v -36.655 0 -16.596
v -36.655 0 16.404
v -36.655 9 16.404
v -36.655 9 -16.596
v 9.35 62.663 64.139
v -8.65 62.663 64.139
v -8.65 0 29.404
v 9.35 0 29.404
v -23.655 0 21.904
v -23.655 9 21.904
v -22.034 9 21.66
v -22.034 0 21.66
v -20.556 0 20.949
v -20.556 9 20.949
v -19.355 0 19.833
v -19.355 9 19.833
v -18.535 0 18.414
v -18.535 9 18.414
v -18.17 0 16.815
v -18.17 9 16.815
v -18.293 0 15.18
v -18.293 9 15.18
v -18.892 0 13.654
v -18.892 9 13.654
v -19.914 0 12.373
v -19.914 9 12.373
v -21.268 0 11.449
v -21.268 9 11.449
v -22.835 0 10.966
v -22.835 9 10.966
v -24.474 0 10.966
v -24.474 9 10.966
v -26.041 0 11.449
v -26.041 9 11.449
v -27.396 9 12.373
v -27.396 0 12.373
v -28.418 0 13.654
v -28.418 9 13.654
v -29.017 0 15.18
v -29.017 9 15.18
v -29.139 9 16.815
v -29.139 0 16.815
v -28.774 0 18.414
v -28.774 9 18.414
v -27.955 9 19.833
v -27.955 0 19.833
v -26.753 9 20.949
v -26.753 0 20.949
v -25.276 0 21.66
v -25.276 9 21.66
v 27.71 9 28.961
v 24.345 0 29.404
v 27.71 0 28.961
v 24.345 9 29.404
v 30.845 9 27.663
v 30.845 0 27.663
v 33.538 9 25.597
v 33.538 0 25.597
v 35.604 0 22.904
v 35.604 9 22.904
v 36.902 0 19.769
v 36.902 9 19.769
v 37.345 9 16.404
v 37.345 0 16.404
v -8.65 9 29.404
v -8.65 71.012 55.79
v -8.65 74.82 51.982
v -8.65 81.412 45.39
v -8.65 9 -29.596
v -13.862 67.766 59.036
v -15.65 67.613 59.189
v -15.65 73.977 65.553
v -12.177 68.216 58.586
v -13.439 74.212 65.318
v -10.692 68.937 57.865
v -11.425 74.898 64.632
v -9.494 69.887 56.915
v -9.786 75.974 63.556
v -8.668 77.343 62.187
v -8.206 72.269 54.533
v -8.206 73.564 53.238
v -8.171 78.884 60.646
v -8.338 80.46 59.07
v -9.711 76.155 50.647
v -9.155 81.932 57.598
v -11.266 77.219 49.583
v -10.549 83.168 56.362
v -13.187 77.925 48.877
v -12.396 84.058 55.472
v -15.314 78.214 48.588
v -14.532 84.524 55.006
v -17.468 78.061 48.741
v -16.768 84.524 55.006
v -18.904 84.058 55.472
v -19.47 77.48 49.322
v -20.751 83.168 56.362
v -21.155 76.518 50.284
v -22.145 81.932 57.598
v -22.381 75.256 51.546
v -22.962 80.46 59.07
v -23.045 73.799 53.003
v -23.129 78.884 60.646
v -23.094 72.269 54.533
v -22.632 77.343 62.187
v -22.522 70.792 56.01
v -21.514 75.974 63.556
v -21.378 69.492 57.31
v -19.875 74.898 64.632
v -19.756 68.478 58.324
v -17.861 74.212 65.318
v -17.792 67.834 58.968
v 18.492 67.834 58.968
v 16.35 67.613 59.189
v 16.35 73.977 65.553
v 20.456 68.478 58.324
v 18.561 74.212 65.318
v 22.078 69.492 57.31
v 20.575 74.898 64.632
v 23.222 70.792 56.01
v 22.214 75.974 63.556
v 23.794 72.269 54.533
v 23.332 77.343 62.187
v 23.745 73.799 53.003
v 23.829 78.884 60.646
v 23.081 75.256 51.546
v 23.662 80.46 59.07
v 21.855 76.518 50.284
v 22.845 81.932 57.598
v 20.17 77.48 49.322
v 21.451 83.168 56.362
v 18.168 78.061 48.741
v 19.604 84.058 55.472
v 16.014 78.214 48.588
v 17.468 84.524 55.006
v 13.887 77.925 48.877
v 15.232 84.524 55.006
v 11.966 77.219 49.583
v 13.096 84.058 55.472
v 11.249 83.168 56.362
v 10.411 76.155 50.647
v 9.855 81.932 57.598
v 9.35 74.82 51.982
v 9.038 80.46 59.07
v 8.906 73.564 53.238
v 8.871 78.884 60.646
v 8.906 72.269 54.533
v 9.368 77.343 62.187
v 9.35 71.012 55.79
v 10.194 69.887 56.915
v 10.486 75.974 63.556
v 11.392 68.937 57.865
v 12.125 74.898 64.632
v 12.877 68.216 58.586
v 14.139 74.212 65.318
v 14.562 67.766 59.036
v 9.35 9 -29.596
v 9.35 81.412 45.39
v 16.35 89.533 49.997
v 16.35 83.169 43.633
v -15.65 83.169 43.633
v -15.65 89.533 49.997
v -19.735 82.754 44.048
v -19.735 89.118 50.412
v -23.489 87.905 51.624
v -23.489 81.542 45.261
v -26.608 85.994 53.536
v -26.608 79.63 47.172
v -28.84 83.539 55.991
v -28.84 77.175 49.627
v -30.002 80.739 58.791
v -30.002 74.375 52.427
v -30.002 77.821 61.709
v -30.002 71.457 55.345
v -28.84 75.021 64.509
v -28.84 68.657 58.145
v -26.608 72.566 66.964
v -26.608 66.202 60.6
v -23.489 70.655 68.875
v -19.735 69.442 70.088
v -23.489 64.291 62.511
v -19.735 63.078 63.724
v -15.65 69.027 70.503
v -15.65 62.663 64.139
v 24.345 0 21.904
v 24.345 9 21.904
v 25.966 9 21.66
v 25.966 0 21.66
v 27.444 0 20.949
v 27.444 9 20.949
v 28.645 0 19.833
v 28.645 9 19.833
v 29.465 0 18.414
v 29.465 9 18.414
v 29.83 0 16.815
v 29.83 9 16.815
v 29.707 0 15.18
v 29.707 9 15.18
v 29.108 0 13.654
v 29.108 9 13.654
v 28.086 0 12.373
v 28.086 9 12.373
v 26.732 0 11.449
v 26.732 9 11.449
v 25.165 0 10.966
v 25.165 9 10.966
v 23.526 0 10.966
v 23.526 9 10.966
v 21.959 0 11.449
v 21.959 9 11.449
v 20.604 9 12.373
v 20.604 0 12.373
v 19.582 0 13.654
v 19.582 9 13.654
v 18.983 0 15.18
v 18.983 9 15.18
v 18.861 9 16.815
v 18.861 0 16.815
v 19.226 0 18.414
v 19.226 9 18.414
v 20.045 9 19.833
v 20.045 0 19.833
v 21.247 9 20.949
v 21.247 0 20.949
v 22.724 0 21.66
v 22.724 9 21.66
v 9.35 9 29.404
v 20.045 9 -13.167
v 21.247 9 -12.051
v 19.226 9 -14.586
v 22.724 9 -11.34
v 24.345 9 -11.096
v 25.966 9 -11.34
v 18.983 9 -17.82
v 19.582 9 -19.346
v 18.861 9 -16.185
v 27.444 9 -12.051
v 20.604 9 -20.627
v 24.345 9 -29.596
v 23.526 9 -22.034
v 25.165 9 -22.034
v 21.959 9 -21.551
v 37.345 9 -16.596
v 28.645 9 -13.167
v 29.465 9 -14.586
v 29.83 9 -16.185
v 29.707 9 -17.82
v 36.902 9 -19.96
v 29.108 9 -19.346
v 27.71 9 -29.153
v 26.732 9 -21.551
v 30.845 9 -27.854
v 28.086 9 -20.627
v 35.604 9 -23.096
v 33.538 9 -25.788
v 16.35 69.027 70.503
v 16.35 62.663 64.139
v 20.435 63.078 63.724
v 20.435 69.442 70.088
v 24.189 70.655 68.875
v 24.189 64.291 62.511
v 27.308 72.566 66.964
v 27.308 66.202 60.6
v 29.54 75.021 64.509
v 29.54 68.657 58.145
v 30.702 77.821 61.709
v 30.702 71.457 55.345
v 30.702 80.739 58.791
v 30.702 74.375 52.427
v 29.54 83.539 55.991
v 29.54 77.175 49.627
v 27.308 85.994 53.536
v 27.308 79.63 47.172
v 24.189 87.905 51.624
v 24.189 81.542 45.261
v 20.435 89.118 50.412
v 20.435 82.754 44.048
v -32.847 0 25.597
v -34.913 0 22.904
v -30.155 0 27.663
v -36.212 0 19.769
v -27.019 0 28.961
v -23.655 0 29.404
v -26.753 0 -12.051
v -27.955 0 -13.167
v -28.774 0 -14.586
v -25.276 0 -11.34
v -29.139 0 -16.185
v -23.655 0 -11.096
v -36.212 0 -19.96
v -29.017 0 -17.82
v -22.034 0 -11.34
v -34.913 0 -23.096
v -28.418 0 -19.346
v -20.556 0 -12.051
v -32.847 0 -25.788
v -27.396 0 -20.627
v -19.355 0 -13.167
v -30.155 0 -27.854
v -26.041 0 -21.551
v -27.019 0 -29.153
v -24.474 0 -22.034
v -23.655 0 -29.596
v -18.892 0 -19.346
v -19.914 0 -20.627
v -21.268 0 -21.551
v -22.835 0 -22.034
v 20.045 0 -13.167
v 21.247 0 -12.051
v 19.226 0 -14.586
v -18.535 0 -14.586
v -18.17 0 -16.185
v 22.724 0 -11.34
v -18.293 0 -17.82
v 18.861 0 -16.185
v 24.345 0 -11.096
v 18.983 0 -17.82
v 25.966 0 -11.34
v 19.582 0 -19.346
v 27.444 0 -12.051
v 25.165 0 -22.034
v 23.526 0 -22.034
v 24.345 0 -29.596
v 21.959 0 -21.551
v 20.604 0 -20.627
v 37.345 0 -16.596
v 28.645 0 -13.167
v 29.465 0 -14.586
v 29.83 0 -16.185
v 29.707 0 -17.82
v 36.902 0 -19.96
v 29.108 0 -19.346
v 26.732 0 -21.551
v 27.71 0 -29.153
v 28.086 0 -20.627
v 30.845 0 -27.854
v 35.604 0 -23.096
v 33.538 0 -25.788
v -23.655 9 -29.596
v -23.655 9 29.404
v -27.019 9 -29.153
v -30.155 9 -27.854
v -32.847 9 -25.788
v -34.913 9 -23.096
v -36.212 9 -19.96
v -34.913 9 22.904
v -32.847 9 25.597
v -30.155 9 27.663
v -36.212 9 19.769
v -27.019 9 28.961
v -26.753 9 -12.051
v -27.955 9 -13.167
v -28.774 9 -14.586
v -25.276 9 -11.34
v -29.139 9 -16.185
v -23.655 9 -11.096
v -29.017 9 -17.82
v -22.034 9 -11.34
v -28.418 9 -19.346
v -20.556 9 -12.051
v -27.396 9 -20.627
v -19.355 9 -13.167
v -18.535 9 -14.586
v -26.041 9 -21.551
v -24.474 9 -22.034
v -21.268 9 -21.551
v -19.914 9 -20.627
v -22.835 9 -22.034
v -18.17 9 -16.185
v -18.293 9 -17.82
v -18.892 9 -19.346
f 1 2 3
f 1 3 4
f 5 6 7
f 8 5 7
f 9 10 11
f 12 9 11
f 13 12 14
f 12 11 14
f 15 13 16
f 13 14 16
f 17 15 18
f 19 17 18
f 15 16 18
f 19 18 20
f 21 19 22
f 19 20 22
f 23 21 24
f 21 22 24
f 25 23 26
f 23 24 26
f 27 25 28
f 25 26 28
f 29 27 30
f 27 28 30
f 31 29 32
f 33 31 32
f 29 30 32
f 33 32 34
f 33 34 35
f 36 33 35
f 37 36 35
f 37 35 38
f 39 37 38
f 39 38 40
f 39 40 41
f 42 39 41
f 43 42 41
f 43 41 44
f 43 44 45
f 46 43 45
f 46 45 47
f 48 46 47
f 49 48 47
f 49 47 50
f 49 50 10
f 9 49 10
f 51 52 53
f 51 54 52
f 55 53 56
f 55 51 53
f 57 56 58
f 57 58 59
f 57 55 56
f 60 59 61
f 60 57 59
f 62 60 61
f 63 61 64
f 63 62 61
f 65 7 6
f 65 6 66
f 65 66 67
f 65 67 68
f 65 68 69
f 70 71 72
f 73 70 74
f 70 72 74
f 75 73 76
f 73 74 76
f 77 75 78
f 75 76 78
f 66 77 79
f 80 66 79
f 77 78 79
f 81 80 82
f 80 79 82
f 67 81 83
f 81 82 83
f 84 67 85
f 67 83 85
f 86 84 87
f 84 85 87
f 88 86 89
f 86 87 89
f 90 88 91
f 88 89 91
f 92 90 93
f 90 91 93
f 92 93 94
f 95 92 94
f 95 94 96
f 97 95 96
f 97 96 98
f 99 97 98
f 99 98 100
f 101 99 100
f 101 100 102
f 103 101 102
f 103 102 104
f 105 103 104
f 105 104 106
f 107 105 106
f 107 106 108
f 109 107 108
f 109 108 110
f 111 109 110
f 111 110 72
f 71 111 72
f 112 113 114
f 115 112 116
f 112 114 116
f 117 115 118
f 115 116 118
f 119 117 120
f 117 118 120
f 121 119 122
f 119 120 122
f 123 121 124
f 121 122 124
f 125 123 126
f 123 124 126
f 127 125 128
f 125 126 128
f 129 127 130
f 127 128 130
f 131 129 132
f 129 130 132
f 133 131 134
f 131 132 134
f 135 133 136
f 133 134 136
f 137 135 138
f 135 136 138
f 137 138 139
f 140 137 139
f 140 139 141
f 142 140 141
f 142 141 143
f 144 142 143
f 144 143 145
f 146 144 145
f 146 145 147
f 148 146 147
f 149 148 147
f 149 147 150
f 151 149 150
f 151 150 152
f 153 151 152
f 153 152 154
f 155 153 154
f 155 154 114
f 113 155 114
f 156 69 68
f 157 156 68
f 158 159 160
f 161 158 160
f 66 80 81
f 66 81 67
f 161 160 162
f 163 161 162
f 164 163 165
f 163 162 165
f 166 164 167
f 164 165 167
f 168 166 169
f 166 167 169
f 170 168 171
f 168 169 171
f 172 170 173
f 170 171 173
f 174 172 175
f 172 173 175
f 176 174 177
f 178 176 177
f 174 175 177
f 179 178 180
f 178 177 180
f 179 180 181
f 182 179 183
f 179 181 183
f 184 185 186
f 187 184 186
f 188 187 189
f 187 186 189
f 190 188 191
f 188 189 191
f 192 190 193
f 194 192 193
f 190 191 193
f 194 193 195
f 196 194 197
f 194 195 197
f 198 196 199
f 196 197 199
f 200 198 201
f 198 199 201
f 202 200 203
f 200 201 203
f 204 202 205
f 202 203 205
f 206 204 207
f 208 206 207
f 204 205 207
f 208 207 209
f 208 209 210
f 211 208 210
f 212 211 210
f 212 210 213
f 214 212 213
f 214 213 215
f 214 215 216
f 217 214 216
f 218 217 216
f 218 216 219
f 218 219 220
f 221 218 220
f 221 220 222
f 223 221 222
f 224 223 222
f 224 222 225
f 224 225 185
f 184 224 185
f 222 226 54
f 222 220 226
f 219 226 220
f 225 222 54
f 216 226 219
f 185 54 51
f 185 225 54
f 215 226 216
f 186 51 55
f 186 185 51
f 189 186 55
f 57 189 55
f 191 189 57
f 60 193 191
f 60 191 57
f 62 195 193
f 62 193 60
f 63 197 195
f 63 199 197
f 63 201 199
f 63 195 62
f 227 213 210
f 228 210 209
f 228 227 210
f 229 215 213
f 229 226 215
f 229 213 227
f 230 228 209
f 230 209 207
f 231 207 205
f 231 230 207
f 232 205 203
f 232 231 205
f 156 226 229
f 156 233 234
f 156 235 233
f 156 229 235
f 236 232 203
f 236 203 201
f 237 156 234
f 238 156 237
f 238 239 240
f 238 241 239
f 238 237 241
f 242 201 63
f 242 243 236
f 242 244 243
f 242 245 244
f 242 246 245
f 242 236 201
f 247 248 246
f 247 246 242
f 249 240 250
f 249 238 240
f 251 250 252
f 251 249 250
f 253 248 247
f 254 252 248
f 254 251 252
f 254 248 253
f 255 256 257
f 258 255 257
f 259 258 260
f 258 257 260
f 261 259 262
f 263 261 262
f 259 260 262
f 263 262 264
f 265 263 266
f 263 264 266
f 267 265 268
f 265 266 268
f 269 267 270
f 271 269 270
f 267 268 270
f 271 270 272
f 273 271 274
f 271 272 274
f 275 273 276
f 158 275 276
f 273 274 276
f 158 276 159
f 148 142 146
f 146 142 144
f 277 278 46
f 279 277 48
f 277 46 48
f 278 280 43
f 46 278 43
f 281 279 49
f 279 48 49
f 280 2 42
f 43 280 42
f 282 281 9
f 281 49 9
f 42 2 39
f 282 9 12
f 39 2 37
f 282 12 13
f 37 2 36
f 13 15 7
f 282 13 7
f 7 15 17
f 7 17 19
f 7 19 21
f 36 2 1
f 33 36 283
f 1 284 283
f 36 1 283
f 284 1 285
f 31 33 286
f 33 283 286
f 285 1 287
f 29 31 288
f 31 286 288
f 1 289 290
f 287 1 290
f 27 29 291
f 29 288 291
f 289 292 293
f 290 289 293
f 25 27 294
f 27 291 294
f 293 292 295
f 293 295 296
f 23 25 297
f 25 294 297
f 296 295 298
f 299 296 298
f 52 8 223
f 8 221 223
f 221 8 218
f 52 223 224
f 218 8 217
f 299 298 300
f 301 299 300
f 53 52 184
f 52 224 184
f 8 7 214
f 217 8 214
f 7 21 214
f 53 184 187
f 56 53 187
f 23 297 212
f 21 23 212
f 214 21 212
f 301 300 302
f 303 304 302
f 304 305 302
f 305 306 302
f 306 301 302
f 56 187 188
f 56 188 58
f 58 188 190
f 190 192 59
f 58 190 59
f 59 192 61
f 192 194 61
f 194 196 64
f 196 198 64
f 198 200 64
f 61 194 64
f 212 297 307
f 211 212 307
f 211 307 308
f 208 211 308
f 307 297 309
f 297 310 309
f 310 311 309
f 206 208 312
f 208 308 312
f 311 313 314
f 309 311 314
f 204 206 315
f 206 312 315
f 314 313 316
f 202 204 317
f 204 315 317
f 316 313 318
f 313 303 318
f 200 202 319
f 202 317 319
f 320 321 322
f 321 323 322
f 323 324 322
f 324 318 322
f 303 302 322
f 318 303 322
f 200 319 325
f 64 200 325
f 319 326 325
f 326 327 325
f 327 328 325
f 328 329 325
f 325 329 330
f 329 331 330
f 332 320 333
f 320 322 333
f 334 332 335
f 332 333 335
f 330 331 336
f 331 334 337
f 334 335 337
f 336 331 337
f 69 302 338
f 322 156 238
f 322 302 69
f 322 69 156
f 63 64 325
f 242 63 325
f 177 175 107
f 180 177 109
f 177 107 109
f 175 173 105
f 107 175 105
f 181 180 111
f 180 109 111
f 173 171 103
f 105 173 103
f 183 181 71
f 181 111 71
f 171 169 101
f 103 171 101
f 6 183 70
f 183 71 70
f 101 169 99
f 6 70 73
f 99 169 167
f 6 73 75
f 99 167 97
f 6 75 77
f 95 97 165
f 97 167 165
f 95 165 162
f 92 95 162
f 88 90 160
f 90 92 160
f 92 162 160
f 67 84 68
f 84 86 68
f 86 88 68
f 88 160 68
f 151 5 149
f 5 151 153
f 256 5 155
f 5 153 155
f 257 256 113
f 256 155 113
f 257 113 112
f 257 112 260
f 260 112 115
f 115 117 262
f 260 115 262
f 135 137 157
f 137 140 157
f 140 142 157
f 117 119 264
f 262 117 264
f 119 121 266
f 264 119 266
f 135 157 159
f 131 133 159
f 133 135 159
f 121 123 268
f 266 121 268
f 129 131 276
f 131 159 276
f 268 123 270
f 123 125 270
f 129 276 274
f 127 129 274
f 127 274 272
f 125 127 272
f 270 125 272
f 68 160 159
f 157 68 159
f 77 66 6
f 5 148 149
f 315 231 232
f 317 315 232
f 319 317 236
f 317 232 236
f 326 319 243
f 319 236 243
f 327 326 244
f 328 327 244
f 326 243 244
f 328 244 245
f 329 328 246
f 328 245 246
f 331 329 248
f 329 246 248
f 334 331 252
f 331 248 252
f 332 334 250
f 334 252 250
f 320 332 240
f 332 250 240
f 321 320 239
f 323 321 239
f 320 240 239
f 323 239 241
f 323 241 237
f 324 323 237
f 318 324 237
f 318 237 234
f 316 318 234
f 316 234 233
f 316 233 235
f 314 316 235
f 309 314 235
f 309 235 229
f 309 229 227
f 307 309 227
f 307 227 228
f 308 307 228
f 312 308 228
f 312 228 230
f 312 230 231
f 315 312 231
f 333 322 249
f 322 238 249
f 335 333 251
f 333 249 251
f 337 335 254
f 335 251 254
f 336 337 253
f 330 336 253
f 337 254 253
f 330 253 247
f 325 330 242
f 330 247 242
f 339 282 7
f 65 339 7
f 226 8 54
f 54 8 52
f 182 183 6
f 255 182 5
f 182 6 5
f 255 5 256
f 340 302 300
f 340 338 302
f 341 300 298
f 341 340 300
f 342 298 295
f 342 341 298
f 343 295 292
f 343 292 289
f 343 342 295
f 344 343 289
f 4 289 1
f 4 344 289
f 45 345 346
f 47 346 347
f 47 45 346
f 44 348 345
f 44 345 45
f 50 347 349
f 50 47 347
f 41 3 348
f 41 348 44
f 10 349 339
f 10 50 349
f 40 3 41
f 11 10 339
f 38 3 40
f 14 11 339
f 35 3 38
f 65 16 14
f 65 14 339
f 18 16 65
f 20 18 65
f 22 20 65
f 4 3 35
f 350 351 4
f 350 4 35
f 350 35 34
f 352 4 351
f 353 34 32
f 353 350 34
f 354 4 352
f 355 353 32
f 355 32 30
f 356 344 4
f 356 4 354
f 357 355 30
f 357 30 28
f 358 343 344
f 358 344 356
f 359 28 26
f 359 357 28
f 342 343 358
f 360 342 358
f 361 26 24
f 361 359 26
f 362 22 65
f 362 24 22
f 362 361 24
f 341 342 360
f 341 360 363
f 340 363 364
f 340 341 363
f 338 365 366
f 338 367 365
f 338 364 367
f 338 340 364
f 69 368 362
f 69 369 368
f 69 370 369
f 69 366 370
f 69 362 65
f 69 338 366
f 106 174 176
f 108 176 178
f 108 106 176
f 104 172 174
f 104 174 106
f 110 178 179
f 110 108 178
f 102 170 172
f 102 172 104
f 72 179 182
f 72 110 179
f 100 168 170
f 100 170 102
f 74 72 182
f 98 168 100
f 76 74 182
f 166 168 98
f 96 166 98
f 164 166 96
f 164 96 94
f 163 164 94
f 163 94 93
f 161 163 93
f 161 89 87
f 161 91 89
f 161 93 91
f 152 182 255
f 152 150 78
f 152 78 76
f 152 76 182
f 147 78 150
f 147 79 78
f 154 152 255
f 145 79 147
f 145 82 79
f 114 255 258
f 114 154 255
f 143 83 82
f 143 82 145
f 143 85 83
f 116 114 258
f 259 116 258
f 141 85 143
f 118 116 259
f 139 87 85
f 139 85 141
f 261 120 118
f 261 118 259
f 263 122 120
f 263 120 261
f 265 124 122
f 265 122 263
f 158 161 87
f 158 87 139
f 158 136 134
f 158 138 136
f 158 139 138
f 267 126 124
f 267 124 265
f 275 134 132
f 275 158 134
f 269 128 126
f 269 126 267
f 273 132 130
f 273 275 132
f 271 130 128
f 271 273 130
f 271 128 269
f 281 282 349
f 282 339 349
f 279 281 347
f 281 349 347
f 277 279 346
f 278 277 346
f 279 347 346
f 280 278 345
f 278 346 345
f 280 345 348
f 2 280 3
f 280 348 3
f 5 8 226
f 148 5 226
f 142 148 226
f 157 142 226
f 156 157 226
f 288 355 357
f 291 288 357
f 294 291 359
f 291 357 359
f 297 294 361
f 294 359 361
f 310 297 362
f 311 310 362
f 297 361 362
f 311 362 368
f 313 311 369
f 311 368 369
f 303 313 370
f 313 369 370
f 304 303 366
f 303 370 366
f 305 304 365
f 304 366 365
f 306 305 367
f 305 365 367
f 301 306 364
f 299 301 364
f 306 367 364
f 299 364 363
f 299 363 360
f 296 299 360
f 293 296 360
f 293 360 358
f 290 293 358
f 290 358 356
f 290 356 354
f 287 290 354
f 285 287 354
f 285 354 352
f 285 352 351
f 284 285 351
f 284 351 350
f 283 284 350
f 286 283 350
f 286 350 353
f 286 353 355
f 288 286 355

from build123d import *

# Parameters (mm, degrees)
SKETCH1_W            = 74
SKETCH1_H            = 59
EXTRUDE1_DEPTH       = 9
SKETCH2_R            = 5.5
CUT_EXTRUDE1_DEPTH   = 49.493093283
LPATTERN1_COUNT      = 2
LPATTERN1_PITCH      = 48
LPATTERN1_COUNT_DIR2 = 2
LPATTERN1_PITCH_DIR2 = 33
RIB2_START           = -9
RIB2_DEPTH           = 18
EXTRUDE2_DEPTH       = 9
SKETCH7_R            = 7.5
CUT_EXTRUDE2_DEPTH   = 9
FILLET8_R            = 13


# Read off the part's stored shape, not the designer's step: Rib2
with BuildPart() as part:
    # Sketch1 → Extrude1 (new body)
    with BuildSketch(Plane(origin=(0, 0, 0), x_dir=(1, 0, 0), z_dir=(0, 1, 0))):
        with Locations((0.345335821, 0.095708955)):
            Rectangle(SKETCH1_W, SKETCH1_H)
    extrude(amount=EXTRUDE1_DEPTH)

    # Sketch2 → Cut-Extrude1 (cut, through all)
    with BuildSketch(Plane(origin=(0, 9, 0), x_dir=(-1, 0, 0), z_dir=(0, 1, 0))):
        with Locations(Location((23.654664179, -16.595708955, 0), (0, 0, 90))):
            Circle(SKETCH2_R)
    cut_extrude1 = extrude(amount=-CUT_EXTRUDE1_DEPTH, mode=Mode.SUBTRACT)

    # LPattern1: Cut-Extrude1 2 × 2
    with Locations(*[(i * LPATTERN1_PITCH, 0, j * LPATTERN1_PITCH_DIR2) for i in range(LPATTERN1_COUNT) for j in range(LPATTERN1_COUNT_DIR2) if (i, j) != (0, 0)]):
        add(cut_extrude1, mode=Mode.SUBTRACT)

    # Rib2 outline → Rib2 (add)
    with BuildSketch(Plane(origin=(0.35, 0, 0), x_dir=(0, 0, -1), z_dir=(1, 0, 0)).offset(RIB2_START)):
        Polygon((29.595708955, 9), (-45.389590013, 81.412461489), (-64.138992076, 62.663059426), (-29.404291045, 0), (-29.404291045, 9), align=None)
    extrude(amount=RIB2_DEPTH)

    # Sketch6 → Extrude2 (add)
    with BuildSketch(Plane(origin=(0, 63.401025751, 63.401025751), x_dir=(1, 0, 0), z_dir=(0, 0.7071067811865438, 0.7071067811865513))):
        with BuildLine():
            Line((16.35, 27.956358014), (-15.65, 27.956358014))
            ThreePointArc((-15.65, 27.956358014), (-30.15, 13.456358014), (-15.65, -1.043641986))
            Line((-15.65, -1.043641986), (16.35, -1.043641986))
            ThreePointArc((16.35, -1.043641986), (30.85, 13.456358014), (16.35, 27.956358014))
        make_face()
    extrude(amount=EXTRUDE2_DEPTH)

    # Sketch7 → Cut-Extrude2 (cut)
    with BuildSketch(Plane(origin=(0, 69.764986782, 69.764986782), x_dir=(1, 0, 0), z_dir=(0, 0.7071067811865438, 0.7071067811865512))):
        with Locations(Location((16.35, 13.456358014, 0), (0, 0, 270))):
            Circle(SKETCH7_R)
        with Locations(Location((-15.65, 13.456358014, 0), (0, 0, 270))):
            Circle(SKETCH7_R)
    extrude(amount=-CUT_EXTRUDE2_DEPTH, mode=Mode.SUBTRACT)

    # Fillet8
    fillet8_edges = [part.edges().sort_by_distance(p)[0] for p in [
        (-36.654664179, 4.5, -29.595708955),
        (37.345335821, 4.5, -29.595708955),
        (37.345335821, 4.5, 29.404291045),
        (-36.654664179, 4.5, 29.404291045),
    ]]
    fillet(fillet8_edges, radius=FILLET8_R)


solid = part.part
